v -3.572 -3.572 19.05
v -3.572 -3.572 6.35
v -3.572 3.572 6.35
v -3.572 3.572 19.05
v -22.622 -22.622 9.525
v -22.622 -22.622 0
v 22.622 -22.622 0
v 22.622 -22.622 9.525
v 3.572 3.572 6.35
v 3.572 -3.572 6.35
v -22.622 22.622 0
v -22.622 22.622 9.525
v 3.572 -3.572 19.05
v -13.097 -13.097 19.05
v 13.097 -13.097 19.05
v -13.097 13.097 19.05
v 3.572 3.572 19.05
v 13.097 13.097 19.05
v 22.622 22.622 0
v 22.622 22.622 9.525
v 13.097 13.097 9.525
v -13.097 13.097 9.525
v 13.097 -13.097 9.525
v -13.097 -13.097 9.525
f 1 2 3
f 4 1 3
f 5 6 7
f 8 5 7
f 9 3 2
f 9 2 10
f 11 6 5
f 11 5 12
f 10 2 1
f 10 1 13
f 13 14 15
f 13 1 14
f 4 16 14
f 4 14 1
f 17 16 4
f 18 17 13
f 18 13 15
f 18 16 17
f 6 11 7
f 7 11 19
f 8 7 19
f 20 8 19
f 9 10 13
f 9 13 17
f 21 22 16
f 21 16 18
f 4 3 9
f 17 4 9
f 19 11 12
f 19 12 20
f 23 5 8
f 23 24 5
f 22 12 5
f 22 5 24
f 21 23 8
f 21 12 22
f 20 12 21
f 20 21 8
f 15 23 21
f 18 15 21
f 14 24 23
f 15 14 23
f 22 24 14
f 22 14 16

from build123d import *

# Parameters (mm, degrees)
F0_W     = 45.24375
F0_H     = 45.24375
F0_W_2   = 26.19375
F0_H_2   = 26.19375
F1_DEPTH = 9.525
F0_W_3   = 7.14375
F0_H_3   = 7.14375
F2_DEPTH = 19.05
F3_DEPTH = 6.35


# Not quite as in the source:
# - a length typed as a fraction of an inch, garbled in the dataset ("3 / 203.2 mm" for 3/8 in), is restored


with BuildPart() as f1:
    # F0 (on Top) → F1 (new body)
    with BuildSketch(Plane.XY):
        Rectangle(F0_W, F0_H)
        Rectangle(F0_W_2, F0_H_2, mode=Mode.SUBTRACT)
    extrude(amount=F1_DEPTH)

    # F0 (on Top) → F2 (join)
    with BuildSketch(Plane.XY):
        Rectangle(F0_W_2, F0_H_2)
        Rectangle(F0_W_3, F0_H_3, mode=Mode.SUBTRACT)
    extrude(amount=F2_DEPTH)

    # F0 (on Top) → F3 (join)
    with BuildSketch(Plane.XY):
        Rectangle(F0_W_3, F0_H_3)
    extrude(amount=F3_DEPTH)


solid = f1.part
